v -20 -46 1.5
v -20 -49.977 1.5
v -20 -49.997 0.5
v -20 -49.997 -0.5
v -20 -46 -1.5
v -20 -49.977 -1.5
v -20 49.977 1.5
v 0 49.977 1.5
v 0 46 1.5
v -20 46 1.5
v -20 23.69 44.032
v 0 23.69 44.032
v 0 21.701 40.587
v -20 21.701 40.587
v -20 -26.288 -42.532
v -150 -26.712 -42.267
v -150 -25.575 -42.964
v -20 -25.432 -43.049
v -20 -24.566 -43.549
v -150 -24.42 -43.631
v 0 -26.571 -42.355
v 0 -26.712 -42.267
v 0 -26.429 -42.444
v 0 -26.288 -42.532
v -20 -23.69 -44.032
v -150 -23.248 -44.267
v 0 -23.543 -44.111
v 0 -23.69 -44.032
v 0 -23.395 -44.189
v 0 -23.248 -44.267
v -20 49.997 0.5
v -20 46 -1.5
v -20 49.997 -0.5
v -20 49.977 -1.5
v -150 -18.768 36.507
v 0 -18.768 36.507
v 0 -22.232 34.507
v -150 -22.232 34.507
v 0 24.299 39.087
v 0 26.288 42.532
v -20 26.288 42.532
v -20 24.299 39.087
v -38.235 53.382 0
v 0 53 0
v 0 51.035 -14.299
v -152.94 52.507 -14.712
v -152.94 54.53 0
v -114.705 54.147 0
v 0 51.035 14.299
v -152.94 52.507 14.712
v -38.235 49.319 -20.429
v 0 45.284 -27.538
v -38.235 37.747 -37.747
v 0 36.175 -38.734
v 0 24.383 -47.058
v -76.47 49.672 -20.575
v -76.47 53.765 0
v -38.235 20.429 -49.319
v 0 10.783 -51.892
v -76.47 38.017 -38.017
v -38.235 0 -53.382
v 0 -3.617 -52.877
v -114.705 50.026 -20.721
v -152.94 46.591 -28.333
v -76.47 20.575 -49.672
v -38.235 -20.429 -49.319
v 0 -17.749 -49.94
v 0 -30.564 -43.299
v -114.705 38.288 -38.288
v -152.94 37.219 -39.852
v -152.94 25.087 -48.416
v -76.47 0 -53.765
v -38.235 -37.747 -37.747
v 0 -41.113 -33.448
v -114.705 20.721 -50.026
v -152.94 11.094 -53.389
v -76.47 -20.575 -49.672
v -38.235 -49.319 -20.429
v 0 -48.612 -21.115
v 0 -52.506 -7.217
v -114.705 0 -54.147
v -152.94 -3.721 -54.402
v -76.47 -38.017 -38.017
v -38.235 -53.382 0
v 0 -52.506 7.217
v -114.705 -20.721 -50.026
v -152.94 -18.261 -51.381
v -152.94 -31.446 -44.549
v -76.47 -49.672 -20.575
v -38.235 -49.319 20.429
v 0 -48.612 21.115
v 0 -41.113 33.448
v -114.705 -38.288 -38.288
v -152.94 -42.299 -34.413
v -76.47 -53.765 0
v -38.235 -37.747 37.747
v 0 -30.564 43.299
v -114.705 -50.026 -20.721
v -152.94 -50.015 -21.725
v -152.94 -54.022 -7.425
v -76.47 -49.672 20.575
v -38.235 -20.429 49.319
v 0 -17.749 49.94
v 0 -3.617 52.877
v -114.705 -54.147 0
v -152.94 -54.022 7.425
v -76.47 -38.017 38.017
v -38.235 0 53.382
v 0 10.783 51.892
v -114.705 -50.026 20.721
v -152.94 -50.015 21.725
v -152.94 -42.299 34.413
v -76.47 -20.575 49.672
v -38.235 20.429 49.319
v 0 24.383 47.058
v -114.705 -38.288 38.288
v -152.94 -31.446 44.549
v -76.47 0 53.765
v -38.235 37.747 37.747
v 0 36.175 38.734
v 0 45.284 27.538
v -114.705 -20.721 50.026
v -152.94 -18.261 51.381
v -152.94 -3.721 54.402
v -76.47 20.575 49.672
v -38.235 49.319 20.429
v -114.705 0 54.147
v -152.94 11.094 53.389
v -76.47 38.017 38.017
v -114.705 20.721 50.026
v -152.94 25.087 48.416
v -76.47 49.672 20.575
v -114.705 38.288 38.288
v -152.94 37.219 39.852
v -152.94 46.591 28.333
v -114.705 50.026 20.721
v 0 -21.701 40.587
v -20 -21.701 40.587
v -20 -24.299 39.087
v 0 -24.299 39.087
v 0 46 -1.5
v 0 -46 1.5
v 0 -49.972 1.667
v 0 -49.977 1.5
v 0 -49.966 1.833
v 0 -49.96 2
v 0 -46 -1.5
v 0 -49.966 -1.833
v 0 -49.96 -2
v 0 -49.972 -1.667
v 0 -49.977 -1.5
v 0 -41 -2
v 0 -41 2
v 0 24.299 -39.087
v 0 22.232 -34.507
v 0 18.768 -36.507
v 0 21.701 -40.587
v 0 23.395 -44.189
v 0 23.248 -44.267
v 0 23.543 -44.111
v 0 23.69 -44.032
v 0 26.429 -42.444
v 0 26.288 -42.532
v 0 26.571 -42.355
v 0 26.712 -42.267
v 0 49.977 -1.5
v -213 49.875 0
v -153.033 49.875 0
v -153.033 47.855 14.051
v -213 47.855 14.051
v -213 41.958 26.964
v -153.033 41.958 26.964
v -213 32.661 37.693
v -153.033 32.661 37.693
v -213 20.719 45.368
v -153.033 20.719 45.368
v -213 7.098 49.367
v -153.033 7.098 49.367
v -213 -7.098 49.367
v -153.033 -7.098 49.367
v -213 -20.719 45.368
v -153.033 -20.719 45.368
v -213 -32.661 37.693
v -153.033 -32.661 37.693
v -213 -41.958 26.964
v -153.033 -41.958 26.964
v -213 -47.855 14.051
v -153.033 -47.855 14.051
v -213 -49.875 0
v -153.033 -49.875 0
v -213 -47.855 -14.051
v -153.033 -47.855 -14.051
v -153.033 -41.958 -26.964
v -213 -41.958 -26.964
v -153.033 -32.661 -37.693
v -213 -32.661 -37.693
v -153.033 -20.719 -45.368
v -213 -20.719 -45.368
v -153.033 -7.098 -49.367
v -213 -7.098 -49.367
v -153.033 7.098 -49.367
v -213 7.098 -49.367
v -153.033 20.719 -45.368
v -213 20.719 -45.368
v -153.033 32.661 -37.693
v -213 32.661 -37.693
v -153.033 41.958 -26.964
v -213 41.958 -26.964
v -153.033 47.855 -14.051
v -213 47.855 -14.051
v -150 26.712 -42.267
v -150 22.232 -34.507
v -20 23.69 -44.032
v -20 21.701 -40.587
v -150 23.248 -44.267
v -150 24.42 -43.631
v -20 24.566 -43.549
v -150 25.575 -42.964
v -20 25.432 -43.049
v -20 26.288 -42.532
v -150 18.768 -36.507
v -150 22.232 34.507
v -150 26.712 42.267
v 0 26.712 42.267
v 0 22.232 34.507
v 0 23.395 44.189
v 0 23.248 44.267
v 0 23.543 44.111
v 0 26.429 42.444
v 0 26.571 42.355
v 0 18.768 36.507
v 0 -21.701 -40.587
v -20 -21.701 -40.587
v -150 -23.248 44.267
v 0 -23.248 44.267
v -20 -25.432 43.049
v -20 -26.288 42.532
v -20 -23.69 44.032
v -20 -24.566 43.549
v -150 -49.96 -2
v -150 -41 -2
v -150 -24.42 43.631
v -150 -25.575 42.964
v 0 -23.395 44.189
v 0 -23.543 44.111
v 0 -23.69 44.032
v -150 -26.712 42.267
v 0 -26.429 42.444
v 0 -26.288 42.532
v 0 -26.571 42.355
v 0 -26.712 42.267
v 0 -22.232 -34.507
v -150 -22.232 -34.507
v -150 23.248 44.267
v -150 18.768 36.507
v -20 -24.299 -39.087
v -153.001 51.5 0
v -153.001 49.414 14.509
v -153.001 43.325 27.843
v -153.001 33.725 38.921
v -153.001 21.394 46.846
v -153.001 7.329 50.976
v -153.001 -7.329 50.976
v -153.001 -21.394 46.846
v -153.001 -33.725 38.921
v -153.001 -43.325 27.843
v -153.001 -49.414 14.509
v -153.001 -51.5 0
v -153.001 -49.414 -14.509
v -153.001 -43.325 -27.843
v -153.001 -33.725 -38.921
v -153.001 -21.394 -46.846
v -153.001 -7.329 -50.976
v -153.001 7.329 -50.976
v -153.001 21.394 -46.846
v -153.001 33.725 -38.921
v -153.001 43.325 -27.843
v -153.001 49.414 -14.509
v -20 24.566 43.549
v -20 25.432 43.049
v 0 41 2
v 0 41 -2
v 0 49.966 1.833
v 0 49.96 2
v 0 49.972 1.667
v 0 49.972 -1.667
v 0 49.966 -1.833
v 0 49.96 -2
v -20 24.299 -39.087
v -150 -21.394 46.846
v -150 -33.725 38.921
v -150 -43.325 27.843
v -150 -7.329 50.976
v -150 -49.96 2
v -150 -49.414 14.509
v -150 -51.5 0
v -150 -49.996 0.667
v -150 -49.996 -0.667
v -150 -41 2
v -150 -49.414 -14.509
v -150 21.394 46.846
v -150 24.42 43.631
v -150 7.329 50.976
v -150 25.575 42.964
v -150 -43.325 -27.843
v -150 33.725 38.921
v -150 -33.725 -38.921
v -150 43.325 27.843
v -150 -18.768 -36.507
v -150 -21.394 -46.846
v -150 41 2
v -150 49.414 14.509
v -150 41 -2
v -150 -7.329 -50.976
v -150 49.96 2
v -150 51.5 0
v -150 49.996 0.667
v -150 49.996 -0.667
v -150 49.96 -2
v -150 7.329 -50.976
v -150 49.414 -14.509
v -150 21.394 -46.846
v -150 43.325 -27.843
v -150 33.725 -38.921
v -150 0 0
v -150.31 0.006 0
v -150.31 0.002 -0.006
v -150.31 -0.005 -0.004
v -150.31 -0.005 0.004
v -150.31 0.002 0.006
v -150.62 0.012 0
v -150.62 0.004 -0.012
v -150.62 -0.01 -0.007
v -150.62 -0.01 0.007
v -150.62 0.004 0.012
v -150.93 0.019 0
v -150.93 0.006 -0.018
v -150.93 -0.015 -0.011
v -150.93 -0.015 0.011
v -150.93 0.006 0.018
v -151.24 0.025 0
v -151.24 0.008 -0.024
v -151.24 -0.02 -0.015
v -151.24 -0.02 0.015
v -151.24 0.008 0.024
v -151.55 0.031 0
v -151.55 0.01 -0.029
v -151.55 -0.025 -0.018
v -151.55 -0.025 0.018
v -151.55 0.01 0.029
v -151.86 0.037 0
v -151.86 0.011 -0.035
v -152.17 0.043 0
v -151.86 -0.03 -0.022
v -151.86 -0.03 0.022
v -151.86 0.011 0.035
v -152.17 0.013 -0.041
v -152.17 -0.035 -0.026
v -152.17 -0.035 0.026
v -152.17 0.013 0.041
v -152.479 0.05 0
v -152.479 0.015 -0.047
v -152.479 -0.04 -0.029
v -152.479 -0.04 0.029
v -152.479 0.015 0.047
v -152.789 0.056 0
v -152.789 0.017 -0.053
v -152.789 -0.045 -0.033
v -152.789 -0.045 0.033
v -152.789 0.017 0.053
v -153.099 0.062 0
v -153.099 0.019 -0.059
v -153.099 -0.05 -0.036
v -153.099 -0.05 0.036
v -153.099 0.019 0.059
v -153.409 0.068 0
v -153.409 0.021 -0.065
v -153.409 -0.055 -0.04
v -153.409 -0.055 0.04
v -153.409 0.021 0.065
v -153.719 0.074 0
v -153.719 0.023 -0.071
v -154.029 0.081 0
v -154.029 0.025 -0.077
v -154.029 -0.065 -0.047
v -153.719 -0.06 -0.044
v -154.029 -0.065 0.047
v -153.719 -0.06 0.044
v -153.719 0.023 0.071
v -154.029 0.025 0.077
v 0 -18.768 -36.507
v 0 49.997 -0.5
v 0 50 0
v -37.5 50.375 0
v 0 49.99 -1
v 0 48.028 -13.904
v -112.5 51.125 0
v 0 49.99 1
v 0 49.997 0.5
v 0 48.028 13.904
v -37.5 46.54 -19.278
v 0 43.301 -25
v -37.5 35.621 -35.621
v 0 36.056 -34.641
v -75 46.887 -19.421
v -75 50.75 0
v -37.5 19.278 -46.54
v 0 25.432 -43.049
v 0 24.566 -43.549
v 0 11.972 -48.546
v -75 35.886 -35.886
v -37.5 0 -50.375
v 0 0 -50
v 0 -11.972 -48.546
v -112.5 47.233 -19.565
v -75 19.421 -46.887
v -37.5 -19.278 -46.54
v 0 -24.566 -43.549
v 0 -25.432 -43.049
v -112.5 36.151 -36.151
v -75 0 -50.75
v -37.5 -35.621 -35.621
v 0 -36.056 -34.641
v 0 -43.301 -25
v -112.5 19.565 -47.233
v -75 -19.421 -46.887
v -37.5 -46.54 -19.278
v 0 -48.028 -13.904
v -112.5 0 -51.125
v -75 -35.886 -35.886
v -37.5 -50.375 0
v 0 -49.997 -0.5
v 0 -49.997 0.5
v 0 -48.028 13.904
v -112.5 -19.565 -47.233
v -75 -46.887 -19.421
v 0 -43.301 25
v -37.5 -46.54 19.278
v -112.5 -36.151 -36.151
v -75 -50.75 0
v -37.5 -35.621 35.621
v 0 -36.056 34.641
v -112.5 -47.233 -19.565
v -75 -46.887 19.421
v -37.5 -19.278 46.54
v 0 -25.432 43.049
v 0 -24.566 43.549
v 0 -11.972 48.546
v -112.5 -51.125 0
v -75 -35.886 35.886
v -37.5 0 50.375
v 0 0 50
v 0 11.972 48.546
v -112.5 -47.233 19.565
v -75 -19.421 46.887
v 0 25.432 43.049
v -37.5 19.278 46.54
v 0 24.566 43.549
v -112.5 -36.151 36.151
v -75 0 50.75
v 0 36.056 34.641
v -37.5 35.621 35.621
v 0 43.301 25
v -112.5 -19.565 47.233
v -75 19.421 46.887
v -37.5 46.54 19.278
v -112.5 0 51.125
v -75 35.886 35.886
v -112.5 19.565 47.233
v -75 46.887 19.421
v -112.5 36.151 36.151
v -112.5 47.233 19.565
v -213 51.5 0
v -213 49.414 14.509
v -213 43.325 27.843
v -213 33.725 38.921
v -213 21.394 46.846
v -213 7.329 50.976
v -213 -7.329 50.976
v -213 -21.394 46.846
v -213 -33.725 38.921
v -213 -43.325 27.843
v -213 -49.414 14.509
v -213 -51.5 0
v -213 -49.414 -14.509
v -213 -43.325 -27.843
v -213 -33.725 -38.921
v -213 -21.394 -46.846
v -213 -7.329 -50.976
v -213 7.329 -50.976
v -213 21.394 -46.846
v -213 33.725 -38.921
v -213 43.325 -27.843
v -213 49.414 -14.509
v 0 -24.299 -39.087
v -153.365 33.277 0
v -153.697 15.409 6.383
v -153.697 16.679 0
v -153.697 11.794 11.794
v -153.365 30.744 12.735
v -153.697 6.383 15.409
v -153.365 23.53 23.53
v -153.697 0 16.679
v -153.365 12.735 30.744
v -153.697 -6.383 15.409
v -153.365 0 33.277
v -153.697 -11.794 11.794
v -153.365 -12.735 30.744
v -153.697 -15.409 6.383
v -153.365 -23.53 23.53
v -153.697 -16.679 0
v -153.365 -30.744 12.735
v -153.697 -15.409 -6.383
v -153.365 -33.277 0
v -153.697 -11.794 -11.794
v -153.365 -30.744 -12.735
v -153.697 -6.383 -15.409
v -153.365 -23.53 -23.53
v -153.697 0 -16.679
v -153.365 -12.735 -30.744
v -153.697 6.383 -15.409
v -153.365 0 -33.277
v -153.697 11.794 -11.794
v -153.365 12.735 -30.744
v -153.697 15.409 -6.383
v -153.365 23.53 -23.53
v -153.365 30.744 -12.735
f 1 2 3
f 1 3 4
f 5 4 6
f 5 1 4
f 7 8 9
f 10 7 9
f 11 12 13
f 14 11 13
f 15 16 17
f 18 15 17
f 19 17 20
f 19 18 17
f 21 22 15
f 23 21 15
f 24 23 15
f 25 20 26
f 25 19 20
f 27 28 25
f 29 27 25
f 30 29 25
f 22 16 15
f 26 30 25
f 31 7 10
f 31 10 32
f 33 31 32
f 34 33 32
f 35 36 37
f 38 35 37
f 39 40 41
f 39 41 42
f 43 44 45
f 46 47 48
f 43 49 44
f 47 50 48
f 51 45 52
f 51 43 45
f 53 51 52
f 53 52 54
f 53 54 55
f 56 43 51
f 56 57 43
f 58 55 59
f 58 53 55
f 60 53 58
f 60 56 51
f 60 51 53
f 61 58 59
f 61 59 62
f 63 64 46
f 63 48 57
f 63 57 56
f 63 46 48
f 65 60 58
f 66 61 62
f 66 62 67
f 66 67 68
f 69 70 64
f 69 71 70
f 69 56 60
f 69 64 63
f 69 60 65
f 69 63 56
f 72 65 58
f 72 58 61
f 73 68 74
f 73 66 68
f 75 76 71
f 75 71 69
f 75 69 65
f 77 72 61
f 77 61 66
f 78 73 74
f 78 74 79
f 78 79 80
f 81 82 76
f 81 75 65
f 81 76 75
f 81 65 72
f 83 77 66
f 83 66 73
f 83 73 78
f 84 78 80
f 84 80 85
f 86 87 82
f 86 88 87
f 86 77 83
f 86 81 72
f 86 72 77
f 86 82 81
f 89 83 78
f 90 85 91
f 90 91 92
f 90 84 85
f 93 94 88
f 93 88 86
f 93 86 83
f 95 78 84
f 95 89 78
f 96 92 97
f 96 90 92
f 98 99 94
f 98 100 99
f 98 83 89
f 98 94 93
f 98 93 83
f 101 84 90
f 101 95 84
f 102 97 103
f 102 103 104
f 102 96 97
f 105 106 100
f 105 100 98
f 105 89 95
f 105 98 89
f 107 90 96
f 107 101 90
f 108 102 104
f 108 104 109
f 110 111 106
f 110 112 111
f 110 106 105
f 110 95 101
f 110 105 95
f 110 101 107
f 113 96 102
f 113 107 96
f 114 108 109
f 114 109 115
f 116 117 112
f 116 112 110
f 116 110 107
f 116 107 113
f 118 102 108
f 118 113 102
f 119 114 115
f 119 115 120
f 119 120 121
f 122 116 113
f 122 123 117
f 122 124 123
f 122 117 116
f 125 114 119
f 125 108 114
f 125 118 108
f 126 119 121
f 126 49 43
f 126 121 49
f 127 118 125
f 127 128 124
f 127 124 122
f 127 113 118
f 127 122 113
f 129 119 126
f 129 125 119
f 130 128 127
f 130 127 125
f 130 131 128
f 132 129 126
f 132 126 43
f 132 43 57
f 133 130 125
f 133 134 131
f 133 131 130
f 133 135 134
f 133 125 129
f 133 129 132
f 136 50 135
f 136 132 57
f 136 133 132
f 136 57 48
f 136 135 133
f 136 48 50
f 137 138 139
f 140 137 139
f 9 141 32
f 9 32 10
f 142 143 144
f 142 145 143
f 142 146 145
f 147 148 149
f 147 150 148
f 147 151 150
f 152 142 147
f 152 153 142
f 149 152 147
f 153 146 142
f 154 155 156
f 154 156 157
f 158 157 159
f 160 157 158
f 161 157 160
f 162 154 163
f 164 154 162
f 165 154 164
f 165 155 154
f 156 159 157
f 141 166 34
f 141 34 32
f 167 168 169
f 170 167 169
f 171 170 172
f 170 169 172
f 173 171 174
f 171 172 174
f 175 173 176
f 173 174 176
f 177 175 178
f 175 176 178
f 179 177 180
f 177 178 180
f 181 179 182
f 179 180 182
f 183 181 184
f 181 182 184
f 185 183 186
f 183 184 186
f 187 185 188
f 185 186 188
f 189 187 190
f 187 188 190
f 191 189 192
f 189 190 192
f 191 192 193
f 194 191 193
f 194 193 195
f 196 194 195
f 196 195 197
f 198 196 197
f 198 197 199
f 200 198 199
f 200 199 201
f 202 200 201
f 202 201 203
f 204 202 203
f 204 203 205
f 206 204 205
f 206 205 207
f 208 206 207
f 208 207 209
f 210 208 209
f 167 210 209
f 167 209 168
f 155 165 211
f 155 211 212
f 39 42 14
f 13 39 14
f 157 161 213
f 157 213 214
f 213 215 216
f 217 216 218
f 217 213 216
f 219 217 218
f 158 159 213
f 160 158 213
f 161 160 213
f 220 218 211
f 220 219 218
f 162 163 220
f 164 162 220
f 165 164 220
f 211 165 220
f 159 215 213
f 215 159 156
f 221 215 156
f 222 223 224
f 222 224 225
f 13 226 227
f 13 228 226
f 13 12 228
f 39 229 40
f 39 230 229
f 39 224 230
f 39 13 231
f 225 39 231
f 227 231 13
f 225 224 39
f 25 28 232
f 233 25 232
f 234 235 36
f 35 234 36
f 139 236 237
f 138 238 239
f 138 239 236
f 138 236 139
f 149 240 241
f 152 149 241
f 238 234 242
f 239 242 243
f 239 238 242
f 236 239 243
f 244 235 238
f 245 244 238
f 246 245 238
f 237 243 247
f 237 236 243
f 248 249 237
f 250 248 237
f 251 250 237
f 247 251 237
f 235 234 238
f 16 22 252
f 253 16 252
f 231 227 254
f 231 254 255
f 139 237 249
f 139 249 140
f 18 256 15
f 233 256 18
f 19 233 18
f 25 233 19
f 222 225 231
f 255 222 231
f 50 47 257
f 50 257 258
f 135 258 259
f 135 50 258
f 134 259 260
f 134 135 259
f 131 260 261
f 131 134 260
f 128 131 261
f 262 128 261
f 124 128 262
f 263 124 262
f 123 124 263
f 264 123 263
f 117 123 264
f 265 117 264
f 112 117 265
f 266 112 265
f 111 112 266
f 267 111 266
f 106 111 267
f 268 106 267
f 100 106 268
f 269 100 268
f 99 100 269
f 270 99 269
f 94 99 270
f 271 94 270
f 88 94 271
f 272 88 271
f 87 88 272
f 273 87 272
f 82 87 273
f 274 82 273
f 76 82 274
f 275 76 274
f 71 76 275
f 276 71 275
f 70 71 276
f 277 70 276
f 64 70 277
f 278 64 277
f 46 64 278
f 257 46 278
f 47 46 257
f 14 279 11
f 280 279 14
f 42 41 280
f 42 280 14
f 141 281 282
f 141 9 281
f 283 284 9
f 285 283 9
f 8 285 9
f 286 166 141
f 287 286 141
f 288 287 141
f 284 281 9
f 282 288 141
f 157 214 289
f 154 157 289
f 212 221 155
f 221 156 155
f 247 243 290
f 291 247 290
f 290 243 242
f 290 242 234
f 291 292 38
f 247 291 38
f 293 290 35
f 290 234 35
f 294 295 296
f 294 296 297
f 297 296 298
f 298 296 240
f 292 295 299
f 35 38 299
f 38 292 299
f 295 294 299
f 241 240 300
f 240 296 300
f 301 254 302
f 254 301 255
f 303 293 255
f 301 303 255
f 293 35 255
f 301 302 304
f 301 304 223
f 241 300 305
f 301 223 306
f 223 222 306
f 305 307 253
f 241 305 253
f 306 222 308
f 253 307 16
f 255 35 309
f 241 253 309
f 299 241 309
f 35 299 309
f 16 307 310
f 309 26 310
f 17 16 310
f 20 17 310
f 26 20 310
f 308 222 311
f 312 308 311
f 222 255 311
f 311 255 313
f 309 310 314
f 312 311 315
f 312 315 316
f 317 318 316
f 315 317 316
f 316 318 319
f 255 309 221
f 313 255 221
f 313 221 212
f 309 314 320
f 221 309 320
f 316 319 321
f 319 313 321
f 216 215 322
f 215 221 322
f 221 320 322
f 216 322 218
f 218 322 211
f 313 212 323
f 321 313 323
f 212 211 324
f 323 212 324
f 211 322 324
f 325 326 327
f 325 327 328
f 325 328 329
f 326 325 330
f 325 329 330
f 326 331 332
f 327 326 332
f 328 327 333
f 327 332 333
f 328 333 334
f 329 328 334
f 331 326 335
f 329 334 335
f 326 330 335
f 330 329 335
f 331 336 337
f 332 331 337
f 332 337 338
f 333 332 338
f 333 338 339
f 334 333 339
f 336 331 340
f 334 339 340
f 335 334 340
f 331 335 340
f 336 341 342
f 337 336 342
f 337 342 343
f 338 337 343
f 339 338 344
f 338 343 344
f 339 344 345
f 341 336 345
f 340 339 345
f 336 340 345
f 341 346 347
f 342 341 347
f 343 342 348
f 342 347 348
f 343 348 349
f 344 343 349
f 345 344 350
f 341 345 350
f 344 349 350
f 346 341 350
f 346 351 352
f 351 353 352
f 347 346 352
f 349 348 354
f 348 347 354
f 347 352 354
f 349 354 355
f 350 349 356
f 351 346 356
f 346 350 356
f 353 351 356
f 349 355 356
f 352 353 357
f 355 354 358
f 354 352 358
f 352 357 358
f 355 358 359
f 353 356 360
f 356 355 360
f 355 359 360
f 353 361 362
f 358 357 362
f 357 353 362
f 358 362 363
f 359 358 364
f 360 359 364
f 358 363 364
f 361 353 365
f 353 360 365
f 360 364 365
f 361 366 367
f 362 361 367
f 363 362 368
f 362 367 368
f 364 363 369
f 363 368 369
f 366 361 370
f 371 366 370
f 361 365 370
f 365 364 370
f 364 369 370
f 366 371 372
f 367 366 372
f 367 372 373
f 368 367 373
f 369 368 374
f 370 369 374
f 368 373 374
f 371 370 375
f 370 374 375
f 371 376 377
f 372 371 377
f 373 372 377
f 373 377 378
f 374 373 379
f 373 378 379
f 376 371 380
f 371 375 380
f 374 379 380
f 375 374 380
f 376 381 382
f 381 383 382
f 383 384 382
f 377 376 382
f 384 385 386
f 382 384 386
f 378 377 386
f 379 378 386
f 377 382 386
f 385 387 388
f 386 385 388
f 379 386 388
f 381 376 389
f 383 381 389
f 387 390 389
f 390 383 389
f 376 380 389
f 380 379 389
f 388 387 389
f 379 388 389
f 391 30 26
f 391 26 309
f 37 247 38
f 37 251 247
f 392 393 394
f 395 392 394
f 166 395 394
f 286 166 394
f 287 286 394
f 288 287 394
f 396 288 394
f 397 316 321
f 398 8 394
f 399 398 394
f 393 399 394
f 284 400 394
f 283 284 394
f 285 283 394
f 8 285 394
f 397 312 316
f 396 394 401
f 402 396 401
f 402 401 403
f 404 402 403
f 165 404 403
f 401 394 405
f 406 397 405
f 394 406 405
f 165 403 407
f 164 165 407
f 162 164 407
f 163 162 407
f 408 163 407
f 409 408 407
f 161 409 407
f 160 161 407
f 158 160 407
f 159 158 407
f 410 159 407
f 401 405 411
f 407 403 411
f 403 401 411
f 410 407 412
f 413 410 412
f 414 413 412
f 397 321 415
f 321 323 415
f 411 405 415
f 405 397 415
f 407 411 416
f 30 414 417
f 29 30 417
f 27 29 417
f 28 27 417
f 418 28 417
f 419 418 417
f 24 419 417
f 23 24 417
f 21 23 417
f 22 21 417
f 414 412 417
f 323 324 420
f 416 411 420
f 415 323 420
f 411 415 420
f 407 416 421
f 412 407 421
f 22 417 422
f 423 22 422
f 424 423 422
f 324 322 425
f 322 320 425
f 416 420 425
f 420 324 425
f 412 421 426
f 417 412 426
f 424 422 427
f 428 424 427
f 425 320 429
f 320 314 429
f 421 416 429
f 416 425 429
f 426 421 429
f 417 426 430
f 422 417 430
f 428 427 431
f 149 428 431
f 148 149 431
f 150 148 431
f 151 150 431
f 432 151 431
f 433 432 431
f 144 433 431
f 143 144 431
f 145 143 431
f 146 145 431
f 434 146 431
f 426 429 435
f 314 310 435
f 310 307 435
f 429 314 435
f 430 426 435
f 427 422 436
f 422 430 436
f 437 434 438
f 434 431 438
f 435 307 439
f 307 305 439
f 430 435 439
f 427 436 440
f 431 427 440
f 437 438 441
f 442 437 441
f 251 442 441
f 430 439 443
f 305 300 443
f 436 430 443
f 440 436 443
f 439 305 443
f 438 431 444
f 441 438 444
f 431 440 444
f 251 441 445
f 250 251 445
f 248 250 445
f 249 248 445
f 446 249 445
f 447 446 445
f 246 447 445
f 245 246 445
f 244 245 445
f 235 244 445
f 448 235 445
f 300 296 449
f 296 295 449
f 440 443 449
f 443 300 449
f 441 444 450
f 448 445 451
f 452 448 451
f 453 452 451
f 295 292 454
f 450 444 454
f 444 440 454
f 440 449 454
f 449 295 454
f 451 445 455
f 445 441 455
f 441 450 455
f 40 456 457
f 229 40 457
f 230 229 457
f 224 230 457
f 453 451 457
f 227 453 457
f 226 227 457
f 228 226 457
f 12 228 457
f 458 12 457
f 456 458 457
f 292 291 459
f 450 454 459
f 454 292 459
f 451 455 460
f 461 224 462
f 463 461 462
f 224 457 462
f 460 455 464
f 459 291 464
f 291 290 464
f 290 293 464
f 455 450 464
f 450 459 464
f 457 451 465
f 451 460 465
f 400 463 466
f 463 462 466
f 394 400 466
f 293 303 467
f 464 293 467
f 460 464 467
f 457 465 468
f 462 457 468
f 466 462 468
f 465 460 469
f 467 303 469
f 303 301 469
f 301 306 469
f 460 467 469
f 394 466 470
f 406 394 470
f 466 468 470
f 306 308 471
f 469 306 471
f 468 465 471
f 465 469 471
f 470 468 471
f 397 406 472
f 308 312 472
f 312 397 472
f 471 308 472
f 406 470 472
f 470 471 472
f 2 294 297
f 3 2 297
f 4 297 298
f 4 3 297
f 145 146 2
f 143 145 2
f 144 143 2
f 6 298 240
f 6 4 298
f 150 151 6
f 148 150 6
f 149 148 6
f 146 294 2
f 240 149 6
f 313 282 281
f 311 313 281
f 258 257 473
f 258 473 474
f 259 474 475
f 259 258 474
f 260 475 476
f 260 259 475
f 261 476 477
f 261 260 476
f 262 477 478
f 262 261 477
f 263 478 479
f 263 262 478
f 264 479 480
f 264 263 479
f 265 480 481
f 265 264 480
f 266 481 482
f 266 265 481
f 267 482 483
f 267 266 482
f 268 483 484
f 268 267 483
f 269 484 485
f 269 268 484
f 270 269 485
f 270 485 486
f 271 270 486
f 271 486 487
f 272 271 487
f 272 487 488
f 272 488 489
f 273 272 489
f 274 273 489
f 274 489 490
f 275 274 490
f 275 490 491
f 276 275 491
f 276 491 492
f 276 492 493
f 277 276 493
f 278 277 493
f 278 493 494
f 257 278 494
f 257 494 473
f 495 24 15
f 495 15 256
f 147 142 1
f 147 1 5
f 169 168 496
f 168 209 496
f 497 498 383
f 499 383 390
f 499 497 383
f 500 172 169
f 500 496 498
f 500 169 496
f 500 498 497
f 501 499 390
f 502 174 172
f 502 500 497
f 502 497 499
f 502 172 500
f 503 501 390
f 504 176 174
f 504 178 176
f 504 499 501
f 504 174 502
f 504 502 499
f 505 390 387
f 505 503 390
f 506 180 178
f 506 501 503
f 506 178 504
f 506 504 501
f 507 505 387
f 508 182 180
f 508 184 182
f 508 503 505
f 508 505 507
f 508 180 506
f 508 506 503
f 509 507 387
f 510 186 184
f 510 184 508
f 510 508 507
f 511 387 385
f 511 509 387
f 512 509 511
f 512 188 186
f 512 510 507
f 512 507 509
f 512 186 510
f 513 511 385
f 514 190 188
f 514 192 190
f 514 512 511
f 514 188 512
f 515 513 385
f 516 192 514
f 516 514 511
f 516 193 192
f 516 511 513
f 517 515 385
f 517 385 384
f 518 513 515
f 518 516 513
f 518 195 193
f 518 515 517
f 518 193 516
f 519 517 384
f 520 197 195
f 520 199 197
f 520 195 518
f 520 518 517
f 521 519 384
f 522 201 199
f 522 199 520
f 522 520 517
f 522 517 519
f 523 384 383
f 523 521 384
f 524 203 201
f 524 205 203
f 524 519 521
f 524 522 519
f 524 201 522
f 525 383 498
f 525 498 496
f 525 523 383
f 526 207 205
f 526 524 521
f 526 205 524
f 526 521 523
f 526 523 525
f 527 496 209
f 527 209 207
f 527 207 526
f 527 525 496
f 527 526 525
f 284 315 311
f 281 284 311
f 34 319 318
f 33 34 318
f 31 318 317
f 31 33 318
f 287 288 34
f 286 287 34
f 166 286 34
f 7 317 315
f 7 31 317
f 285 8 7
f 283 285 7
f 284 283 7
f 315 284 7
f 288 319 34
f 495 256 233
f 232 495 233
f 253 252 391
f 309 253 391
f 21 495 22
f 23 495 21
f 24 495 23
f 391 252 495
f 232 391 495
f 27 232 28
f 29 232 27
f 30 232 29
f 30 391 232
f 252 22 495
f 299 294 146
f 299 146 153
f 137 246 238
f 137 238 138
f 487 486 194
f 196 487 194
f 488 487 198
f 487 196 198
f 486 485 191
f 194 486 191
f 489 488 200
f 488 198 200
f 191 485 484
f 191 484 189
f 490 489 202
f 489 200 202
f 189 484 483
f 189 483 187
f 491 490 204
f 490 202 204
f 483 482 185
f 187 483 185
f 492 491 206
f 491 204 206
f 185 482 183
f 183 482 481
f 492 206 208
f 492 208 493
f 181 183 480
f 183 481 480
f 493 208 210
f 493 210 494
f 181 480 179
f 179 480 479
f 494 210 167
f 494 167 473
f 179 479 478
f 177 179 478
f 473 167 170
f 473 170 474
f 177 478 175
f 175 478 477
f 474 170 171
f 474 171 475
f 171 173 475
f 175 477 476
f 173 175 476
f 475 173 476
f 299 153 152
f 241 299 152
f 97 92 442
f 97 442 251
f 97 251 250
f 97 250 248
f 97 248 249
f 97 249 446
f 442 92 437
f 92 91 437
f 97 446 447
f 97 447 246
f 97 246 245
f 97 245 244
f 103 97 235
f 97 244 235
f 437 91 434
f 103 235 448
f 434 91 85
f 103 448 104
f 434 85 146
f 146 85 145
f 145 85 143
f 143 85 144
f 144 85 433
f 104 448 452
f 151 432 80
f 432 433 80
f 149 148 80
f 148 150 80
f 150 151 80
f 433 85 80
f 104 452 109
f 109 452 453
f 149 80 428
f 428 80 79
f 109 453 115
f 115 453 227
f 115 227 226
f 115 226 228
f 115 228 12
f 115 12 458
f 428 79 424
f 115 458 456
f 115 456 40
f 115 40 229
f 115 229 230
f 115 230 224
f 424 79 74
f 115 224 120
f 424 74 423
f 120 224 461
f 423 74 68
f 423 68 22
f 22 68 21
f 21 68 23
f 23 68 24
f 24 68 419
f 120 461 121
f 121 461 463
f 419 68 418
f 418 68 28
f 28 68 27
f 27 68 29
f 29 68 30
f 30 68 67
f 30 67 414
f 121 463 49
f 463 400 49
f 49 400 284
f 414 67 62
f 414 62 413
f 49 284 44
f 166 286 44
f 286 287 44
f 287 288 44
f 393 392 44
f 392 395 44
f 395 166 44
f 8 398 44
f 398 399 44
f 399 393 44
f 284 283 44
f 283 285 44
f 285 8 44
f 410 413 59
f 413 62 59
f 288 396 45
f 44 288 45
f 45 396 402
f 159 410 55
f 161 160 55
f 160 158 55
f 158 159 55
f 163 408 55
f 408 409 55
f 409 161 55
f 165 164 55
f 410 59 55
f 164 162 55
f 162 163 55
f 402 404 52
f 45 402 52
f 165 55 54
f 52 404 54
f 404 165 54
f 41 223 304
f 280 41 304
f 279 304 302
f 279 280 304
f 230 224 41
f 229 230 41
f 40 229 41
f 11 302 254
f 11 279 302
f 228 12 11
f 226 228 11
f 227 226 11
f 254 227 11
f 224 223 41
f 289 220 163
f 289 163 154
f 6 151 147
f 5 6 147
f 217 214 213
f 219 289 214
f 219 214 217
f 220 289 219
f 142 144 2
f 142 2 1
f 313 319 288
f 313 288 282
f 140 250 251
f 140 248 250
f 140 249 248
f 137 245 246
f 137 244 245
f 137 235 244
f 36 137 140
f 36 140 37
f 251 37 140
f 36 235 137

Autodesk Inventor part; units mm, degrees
ref_plane "XZ Plane" through (0, 0, 0) normal (0, 1, 0) x (-1, 0, 0)
ref_plane "XY Plane" through (0, 0, 0) normal (0, 0, 1) x (1, 0, 0)
sketch "Reinforcment" plane through (0, 0, 0) normal (0, 0, 1) x (1, 0, 0)
  line L0 (0, 0) -> (-150, 0)
  line L1 (-150, 0) -> (-150, 51.5)
  line L2 (-150, 51.5) -> (0, 50)
  line L3 (-154.0291, 0.0806) -> (-152.94, 54.5296)
  line L4 (-152.94, 54.5296) -> (0, 53.0001)
  line L5 (-150, 0) -> (-154.0291, 0.0806)
  line L6 (0, 50) -> (0, 53.0001)
  dimension "d1" = 50
  dimension "d2" = 51.5
  dimension "d3" = 3
revolve "Revolution1" add sketch "Reinforcment" angle 360 about axis through (0, 0, 0) along (-1, 0, 0)
sketch "Sketch2" plane through (0, 0, 0) normal (1, 0, 0) x (0, 0, -1)
  circle A0 centre (0, 0) radius 50 projected
  line L0 (0, 50) -> (2, 50)
  line L1 (2, 50) -> (2, 41)
  line L2 (2, 41) -> (0, 41)
  line L3 (0, 50) -> (-2, 50)
  line L4 (-2, 50) -> (-2, 41)
  line L5 (-2, 41) -> (0, 41)
  line L6 (-43.3013, 25) -> (-42.3013, 26.7321)
  line L7 (-42.3013, 26.7321) -> (-34.507, 22.2321)
  line L8 (-34.507, 22.2321) -> (-35.507, 20.5)
  line L9 (-43.3013, 25) -> (-44.3013, 23.2679)
  line L10 (-44.3013, 23.2679) -> (-36.507, 18.7679)
  line L11 (-36.507, 18.7679) -> (-35.507, 20.5)
  line L12 (-43.3013, -25) -> (-44.3013, -23.2679)
  line L13 (-44.3013, -23.2679) -> (-36.507, -18.7679)
  line L14 (-36.507, -18.7679) -> (-35.507, -20.5)
  line L15 (-43.3013, -25) -> (-42.3013, -26.7321)
  line L16 (-42.3013, -26.7321) -> (-34.507, -22.2321)
  line L17 (-34.507, -22.2321) -> (-35.507, -20.5)
  line L18 (0, -50) -> (-2, -50)
  line L19 (-2, -50) -> (-2, -41)
  line L20 (-2, -41) -> (0, -41)
  line L21 (0, -50) -> (2, -50)
  line L22 (2, -50) -> (2, -41)
  line L23 (2, -41) -> (0, -41)
  line L24 (43.3013, -25) -> (42.3013, -26.7321)
  line L25 (42.3013, -26.7321) -> (34.507, -22.2321)
  line L26 (34.507, -22.2321) -> (35.507, -20.5)
  line L27 (43.3013, -25) -> (44.3013, -23.2679)
  line L28 (44.3013, -23.2679) -> (36.507, -18.7679)
  line L29 (36.507, -18.7679) -> (35.507, -20.5)
  line L30 (43.3013, 25) -> (44.3013, 23.2679)
  line L31 (44.3013, 23.2679) -> (36.507, 18.7679)
  line L32 (36.507, 18.7679) -> (35.507, 20.5)
  line L33 (43.3013, 25) -> (42.3013, 26.7321)
  line L34 (42.3013, 26.7321) -> (34.507, 22.2321)
  line L35 (34.507, 22.2321) -> (35.507, 20.5)
  point P0 (44.2666, 23.2479)
  point P1 (42.2666, 26.712)
  point P2 (42.2666, -26.712)
  point P3 (44.2666, -23.2479)
  point P4 (0, -41)
  point P5 (-2, -49.96)
  point P6 (2, -49.96)
  point P7 (-44.2666, -23.2479)
  point P8 (-42.2666, -26.712)
  point P9 (-42.2666, 26.712)
  point P10 (-44.2666, 23.2479)
  point P11 (2, 49.96)
  point P12 (-2, 49.96)
  dimension "d5" = 2
  dimension "d6" = 9
  dimension "d7" = 2
  dimension "d10" = 360
extrude "Extrusion1" add sketch "Sketch2" against normal up to next contours L31 L32 L35 L34 A0 | A0 L25 L26 L29 L28 | L1 L2 L5 L4 A0 | A0 L19 L20 L23 L22 | L7 L8 L11 L10 A0 | A0 L13 L14 L17 L16
sketch "Sketch3" plane through (0, 0, 0) normal (1, 0, 0) x (0, 0, -1)
  circle A0 centre (0, 0) radius 53.8081
  circle A1 centre (0, 0) radius 50
  line L0 (0, 50) -> (1.5, 50)
  line L1 (1.5, 50) -> (1.5, 46)
  line L2 (1.5, 46) -> (0, 46)
  line L3 (0, 50) -> (-1.5, 50)
  line L4 (-1.5, 50) -> (-1.5, 46)
  line L5 (-1.5, 46) -> (0, 46)
  line L6 (-43.3013, 25) -> (-42.5513, 26.299)
  line L7 (-42.5513, 26.299) -> (-39.0872, 24.299)
  line L8 (-39.0872, 24.299) -> (-39.8372, 23)
  line L9 (-43.3013, 25) -> (-44.0513, 23.701)
  line L10 (-44.0513, 23.701) -> (-40.5872, 21.701)
  line L11 (-40.5872, 21.701) -> (-39.8372, 23)
  line L12 (-43.3013, -25) -> (-44.0513, -23.701)
  line L13 (-44.0513, -23.701) -> (-40.5872, -21.701)
  line L14 (-40.5872, -21.701) -> (-39.8372, -23)
  line L15 (-43.3013, -25) -> (-42.5513, -26.299)
  line L16 (-42.5513, -26.299) -> (-39.0872, -24.299)
  line L17 (-39.0872, -24.299) -> (-39.8372, -23)
  line L18 (0, -50) -> (-1.5, -50)
  line L19 (-1.5, -50) -> (-1.5, -46)
  line L20 (-1.5, -46) -> (0, -46)
  line L21 (0, -50) -> (1.5, -50)
  line L22 (1.5, -50) -> (1.5, -46)
  line L23 (1.5, -46) -> (0, -46)
  line L24 (43.3013, -25) -> (42.5513, -26.299)
  line L25 (42.5513, -26.299) -> (39.0872, -24.299)
  line L26 (39.0872, -24.299) -> (39.8372, -23)
  line L27 (43.3013, -25) -> (44.0513, -23.701)
  line L28 (44.0513, -23.701) -> (40.5872, -21.701)
  line L29 (40.5872, -21.701) -> (39.8372, -23)
  line L30 (43.3013, 25) -> (44.0513, 23.701)
  line L31 (44.0513, 23.701) -> (40.5872, 21.701)
  line L32 (40.5872, 21.701) -> (39.8372, 23)
  line L33 (43.3013, 25) -> (42.5513, 26.299)
  line L34 (42.5513, 26.299) -> (39.0872, 24.299)
  line L35 (39.0872, 24.299) -> (39.8372, 23)
  point P0 (-42.5318, 26.2878)
  point P1 (-44.0318, 23.6897)
  point P2 (-44.0318, -23.6897)
  point P3 (-42.5318, -26.2878)
  point P4 (0, -46)
  point P5 (-1.5, -49.9775)
  point P6 (1.5, -49.9775)
  point P7 (42.5318, -26.2878)
  point P8 (44.0318, -23.6897)
  point P9 (44.0318, 23.6897)
  point P10 (42.5318, 26.2878)
  point P11 (1.5, 49.9775)
  point P12 (-1.5, 49.9775)
  dimension "d32" = 1.5
  dimension "d33" = 4
  dimension "d34" = 1.5
  dimension "d37" = 360
extrude "Extrusion2" cut sketch "Sketch3" against normal blind 20 contours L31 L32 L35 L34 A1 | A1 L25 L26 L29 L28 | L1 L2 L5 L4 A1 | A1 L19 L20 L23 L22 | L7 L8 L11 L10 A1 | A1 L13 L14 L17 L16
ref_plane "Work Plane1" through (-153, 0, 0) normal (1, 0, 0) x (0, 1, 0)
sketch "Sketch5" plane through (-153, 0, 0) normal (1, 0, 0) x (0, 1, 0)
  circle A0 centre (0, 0) radius 51.5
  circle A1 centre (0, 0) radius 49.875
  dimension "d28" = 103
  dimension "d29" = 99.75
extrude "Extrusion4" add sketch "Sketch5" against normal blind 60
equation "\"BendRadius\" = Thickness"
equation "\"BendReliefWidth\" = Thickness"
equation "\"BendReliefDepth\" = 0.5 * Thickness"
equation "\"CornerReliefSize\" = 4 * Thickness"
equation "\"MinimumRemnant\" = 2 * Thickness"
equation "\"TransitionRadius\" = BendRadius"
equation "\"JacobiRadiusSize\" = BendRadius"
equation "\"GapSize\" = Thickness"
equation "\"Thickness\" = 0.5"
properties part number "Nosecone(finale)"
